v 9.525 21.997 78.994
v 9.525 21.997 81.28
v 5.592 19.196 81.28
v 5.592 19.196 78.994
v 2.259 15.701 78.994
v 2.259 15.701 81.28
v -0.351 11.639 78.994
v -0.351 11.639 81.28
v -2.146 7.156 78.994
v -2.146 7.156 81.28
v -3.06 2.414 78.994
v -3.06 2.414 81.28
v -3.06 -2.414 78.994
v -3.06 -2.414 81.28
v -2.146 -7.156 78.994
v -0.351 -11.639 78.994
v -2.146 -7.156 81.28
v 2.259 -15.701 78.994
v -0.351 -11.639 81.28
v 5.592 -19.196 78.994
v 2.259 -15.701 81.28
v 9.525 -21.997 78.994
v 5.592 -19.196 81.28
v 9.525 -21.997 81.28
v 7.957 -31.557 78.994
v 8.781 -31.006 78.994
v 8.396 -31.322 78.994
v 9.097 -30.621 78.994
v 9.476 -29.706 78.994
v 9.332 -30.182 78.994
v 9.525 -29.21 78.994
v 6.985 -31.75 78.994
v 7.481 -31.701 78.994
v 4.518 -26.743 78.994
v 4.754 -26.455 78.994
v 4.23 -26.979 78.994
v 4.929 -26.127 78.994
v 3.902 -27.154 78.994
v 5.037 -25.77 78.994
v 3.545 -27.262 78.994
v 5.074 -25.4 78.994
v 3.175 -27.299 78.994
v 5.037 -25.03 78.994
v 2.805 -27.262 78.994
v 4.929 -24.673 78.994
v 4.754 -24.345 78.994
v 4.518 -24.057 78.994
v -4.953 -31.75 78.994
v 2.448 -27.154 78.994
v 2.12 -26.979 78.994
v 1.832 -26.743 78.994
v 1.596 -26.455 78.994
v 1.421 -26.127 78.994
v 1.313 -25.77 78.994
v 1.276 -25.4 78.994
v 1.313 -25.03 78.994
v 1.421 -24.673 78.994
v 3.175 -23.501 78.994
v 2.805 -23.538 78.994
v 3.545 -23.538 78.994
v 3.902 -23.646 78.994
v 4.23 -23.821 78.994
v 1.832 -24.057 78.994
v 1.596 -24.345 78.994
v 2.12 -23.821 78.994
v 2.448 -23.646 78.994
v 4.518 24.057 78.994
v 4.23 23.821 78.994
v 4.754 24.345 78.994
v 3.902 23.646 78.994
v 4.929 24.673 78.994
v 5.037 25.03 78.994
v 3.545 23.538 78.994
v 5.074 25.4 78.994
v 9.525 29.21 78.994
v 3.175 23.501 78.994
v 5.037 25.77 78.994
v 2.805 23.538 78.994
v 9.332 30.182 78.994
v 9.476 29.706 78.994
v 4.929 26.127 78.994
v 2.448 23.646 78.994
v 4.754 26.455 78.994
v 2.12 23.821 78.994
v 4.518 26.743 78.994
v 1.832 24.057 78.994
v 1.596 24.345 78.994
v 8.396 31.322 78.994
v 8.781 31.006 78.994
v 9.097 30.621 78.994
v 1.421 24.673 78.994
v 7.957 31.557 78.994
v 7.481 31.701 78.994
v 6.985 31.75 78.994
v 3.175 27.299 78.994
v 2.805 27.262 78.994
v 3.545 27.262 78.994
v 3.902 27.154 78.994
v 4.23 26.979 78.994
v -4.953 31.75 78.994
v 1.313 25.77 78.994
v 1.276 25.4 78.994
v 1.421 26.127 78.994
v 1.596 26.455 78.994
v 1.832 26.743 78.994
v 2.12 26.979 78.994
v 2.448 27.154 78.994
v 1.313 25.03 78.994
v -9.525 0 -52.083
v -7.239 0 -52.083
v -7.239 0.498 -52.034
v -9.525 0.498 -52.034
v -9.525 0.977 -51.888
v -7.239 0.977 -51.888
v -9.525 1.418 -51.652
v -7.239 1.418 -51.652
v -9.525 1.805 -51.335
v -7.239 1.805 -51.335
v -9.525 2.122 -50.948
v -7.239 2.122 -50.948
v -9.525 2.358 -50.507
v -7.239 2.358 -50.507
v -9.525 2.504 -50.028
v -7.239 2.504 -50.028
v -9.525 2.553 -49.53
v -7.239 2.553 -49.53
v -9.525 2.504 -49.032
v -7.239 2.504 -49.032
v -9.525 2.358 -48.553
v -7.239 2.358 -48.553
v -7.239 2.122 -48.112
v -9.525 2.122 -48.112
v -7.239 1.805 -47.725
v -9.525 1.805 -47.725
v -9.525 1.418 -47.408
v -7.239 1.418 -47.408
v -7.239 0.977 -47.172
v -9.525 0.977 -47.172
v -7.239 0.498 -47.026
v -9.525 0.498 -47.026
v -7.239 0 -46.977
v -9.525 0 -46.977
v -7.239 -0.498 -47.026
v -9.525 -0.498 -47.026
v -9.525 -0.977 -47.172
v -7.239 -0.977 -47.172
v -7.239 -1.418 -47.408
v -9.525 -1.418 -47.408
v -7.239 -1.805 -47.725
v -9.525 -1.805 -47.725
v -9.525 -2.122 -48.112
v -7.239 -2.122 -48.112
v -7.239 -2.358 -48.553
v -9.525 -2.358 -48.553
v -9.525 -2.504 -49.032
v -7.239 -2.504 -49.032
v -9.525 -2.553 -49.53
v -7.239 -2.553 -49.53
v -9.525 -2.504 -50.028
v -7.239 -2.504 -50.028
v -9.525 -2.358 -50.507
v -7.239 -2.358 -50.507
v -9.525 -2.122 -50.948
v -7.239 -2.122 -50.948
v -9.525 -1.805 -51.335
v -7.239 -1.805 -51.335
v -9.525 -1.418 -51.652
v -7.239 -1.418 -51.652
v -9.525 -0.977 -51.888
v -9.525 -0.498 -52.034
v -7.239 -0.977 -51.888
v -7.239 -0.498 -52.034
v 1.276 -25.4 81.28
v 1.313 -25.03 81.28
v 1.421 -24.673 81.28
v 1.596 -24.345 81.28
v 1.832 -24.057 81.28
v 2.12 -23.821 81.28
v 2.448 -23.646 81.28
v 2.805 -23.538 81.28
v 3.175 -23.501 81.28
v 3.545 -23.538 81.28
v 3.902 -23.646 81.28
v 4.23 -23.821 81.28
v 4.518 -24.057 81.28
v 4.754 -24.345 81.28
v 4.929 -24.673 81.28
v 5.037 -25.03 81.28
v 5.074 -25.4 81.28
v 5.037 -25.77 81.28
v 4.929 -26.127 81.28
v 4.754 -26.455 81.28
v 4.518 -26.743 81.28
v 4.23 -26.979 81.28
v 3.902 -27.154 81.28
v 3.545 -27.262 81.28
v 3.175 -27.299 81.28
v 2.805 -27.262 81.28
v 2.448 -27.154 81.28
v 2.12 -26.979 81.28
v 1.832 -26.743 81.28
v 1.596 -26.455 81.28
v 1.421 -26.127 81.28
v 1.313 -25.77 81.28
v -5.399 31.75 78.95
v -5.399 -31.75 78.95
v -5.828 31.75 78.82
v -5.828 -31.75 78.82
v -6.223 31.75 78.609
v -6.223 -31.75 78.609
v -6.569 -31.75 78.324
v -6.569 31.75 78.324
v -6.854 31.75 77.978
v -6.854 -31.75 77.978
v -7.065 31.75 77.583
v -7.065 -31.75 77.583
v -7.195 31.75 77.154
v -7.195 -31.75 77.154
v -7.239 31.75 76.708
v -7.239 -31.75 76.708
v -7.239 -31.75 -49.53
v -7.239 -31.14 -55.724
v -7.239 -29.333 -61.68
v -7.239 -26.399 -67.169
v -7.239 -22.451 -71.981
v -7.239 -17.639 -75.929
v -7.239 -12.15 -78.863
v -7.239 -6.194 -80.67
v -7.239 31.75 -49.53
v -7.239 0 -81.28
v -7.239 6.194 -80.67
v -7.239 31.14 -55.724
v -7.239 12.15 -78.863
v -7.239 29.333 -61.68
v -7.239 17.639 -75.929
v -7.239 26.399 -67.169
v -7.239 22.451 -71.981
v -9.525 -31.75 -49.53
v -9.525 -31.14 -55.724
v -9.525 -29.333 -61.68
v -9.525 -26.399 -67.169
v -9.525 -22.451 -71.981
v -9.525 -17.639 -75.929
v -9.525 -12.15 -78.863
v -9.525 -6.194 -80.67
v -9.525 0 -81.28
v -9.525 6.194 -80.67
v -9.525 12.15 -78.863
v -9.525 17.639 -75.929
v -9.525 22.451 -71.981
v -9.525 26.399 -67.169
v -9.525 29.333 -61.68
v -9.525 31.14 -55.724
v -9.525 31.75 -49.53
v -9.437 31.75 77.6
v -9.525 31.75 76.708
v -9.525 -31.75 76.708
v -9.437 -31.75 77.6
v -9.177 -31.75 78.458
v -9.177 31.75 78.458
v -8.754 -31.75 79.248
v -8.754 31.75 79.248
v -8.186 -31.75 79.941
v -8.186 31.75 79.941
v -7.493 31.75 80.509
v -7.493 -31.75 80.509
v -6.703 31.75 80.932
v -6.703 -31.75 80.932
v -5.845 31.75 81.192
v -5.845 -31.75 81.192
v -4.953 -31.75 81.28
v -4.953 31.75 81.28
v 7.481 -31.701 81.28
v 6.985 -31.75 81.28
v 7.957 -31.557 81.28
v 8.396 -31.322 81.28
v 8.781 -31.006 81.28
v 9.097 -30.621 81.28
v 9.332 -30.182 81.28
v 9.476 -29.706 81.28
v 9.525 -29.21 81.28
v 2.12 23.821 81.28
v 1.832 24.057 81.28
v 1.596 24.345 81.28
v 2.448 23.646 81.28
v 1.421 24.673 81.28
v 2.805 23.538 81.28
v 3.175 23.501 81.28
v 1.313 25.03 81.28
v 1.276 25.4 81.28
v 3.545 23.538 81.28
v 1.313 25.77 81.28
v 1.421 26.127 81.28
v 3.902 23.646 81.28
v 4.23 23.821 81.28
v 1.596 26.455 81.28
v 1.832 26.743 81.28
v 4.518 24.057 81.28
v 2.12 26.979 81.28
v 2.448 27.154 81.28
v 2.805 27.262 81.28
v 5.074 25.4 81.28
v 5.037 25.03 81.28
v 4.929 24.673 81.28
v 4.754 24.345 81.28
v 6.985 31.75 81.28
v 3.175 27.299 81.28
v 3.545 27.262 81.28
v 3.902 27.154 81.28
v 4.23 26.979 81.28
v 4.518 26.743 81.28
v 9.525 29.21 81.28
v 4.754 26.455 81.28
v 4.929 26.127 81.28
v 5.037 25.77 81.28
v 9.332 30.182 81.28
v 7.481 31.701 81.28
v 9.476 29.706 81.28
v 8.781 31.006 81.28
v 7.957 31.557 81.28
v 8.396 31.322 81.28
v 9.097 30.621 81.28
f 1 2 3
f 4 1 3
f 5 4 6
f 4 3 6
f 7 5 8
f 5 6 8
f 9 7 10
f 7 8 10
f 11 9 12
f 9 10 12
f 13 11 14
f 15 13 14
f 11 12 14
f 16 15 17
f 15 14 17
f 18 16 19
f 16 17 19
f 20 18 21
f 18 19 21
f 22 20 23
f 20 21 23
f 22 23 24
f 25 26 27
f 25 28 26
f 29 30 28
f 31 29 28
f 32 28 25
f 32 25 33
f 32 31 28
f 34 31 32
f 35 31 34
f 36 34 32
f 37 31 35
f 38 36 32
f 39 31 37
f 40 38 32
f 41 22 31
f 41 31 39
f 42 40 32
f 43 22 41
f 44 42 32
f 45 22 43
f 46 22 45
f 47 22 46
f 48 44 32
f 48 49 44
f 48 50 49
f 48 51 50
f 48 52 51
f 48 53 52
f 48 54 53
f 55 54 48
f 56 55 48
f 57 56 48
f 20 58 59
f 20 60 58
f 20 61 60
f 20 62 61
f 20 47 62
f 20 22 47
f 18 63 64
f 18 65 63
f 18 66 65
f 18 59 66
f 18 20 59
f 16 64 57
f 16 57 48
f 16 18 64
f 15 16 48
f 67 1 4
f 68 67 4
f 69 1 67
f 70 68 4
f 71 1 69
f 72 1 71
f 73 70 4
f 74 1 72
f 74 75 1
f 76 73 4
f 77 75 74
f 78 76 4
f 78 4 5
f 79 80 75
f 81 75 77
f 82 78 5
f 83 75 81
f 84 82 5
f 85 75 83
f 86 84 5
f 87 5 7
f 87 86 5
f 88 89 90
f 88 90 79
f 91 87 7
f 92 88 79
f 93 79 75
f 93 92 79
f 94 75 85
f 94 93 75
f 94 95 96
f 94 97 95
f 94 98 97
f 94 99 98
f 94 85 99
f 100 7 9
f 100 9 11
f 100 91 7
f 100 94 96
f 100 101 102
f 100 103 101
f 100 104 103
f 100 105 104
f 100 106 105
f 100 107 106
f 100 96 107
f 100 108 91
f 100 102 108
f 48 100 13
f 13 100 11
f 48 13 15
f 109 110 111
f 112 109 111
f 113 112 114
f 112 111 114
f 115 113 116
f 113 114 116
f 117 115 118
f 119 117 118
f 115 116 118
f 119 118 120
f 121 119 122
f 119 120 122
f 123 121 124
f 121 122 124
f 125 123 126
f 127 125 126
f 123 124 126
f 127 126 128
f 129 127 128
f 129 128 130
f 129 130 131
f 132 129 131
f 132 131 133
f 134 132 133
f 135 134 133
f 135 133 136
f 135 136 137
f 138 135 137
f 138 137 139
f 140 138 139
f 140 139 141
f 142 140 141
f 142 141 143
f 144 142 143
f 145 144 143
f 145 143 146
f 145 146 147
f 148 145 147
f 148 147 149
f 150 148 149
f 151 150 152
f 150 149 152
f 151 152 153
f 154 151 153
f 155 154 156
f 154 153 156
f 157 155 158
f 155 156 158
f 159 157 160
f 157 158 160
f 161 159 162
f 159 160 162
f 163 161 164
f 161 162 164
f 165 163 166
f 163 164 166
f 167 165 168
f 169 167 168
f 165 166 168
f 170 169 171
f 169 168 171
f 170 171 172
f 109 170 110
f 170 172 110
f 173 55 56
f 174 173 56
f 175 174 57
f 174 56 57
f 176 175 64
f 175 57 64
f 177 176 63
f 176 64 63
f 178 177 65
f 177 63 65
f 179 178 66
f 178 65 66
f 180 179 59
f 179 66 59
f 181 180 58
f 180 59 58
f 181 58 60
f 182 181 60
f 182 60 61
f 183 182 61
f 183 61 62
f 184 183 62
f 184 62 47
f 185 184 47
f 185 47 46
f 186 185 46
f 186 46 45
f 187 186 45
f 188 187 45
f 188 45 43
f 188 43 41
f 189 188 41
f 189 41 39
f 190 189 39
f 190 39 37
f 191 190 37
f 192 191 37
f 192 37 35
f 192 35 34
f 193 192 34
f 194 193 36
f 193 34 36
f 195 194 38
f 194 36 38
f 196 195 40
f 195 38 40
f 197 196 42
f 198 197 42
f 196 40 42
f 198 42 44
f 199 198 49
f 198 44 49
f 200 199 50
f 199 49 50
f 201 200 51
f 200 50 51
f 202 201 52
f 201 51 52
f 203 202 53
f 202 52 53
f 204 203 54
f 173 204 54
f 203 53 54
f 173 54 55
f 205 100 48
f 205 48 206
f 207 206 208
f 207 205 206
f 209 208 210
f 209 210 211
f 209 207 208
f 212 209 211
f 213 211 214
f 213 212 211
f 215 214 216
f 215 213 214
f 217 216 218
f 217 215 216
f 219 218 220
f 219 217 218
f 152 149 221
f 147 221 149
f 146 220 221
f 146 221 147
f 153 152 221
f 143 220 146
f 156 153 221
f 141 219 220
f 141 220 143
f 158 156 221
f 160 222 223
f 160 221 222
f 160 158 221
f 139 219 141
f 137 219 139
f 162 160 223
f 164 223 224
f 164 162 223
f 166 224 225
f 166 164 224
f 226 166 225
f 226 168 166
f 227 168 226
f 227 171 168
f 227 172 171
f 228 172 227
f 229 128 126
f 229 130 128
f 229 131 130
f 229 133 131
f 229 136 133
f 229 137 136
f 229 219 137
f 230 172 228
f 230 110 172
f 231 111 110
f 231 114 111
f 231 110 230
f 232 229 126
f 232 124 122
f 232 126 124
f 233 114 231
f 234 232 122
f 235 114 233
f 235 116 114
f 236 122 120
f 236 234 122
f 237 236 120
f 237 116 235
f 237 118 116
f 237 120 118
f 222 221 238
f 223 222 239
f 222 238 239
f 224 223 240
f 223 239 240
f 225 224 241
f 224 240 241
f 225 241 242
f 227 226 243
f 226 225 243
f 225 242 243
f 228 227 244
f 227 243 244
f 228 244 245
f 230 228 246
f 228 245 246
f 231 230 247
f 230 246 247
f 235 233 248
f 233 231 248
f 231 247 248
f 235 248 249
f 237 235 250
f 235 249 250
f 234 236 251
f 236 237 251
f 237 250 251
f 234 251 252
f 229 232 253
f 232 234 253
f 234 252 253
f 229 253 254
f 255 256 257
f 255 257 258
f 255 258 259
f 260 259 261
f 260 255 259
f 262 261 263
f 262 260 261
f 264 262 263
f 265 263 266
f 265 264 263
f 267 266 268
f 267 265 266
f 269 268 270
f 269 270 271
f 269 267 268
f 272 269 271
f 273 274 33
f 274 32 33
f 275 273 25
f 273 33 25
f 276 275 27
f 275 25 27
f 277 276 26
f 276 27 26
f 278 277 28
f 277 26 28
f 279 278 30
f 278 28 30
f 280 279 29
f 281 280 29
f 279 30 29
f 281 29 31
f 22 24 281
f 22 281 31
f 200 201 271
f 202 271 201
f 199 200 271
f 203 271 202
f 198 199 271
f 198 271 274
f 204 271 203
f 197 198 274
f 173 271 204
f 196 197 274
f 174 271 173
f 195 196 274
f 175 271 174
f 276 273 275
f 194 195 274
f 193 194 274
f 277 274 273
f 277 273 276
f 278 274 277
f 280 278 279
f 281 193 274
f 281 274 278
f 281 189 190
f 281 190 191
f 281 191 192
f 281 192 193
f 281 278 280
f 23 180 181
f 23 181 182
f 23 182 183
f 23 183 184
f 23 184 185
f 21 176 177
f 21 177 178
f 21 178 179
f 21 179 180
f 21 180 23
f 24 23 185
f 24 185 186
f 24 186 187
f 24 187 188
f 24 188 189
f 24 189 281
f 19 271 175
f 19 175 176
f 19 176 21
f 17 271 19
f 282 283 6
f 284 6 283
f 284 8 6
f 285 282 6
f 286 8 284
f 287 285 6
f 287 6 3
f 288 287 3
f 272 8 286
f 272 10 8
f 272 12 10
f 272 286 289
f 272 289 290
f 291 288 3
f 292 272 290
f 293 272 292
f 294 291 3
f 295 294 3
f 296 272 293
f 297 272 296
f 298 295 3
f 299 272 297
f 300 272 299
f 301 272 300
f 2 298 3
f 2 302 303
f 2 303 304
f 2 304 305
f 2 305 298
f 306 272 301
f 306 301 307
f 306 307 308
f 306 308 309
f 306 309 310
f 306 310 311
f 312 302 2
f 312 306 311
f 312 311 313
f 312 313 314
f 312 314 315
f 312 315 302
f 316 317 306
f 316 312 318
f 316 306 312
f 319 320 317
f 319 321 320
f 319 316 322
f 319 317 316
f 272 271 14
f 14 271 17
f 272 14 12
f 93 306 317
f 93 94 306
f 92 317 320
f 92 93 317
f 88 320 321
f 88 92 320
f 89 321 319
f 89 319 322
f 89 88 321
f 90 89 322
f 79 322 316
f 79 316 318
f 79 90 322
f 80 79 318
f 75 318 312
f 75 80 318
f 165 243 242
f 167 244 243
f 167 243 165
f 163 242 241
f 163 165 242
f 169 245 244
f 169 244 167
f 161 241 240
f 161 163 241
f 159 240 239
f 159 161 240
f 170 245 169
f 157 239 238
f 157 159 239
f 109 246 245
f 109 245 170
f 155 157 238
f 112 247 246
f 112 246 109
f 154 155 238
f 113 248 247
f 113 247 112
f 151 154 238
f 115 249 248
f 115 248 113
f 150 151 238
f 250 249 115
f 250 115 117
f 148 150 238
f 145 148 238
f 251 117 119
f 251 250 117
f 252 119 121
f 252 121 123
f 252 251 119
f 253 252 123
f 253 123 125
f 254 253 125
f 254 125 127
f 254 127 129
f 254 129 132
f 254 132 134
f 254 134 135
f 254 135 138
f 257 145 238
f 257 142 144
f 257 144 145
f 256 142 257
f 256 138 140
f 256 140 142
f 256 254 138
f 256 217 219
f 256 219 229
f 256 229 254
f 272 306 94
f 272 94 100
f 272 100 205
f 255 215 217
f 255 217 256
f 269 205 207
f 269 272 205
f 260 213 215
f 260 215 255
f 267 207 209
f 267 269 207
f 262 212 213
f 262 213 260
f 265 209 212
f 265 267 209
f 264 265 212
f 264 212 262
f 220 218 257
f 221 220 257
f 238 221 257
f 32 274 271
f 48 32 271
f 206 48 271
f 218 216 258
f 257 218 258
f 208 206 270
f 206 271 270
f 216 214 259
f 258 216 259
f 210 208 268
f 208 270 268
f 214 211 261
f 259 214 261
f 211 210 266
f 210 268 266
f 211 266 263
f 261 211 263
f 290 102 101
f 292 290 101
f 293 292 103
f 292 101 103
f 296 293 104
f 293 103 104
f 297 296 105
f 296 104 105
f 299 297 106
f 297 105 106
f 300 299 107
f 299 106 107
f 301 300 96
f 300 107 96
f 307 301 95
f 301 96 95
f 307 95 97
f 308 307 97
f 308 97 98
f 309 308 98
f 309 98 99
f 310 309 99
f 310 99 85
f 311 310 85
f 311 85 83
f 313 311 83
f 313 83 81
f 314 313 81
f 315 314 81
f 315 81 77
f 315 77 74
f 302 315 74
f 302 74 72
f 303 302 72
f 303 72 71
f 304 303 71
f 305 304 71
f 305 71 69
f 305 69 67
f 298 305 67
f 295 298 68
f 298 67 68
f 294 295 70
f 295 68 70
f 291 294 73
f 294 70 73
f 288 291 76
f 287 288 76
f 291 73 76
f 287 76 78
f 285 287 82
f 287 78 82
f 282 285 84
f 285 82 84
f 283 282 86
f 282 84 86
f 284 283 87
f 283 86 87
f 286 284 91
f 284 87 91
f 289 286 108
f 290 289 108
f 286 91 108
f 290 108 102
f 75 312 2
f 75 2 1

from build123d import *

# Parameters (mm, degrees)
BASE_FLANGE1_DEPTH           = 31.75
SKETCH6_R                    = 25.4
CUT_EXTRUDE1_DEPTH           = 166.905219101
FILLET1_R                    = 2.54
CUT_EXTRUDE2_DEPTH           = 90.31631094
F_7_0_201_DIAMETER_HOLE1_D   = 5.1054
F_25_0_1495_DIAMETER_HOLE1_D = 3.7973


# Sheet-metal steps are written as plain solids
with BuildPart() as part:
    # Sketch1 → Base-Flange1 (new, symmetric)
    with BuildSketch(Plane(origin=(0, 0, 0), x_dir=(-1, 0, 0), z_dir=(0, 1, 0))):
        with BuildLine():
            Line((9.525, -81.28), (9.525, 76.708))
            ThreePointArc((9.525, 76.708), (8.185892204, 79.940892204), (4.953, 81.28))
            Line((4.953, 81.28), (-9.525, 81.28))
            Line((-9.525, 81.28), (-9.525, 78.994))
            Line((-9.525, 78.994), (4.953, 78.994))
            ThreePointArc((4.953, 78.994), (6.569446102, 78.324446102), (7.239, 76.708))
            Line((7.239, 76.708), (7.239, -81.28))
            Line((7.239, -81.28), (9.525, -81.28))
        make_face()
    extrude(amount=BASE_FLANGE1_DEPTH, both=True)

    # Sketch6 → Cut-Extrude1 (cut, through all)
    with BuildSketch(Plane.XY.offset(81.28)):
        with Locations((22.225, 0)):
            Circle(SKETCH6_R)
    extrude(amount=-CUT_EXTRUDE1_DEPTH, mode=Mode.SUBTRACT)

    # Fillet1
    fillet1_edges = [part.edges().sort_by_distance(p)[0] for p in [
        (9.525, 31.75, 80.137),
        (9.525, -31.75, 80.137),
    ]]
    fillet(fillet1_edges, radius=FILLET1_R)

    # Sketch7 → Cut-Extrude2 (cut, through all)
    with BuildSketch(Plane(origin=(-9.525, 0, 0), x_dir=(0, -1, 0), z_dir=(-1, 0, 0))):
        with BuildLine():
            Line((-31.75, -49.53), (-31.75, -100.33))
            Line((-31.75, -100.33), (31.75, -100.33))
            Line((31.75, -100.33), (31.75, -49.53))
            ThreePointArc((31.75, -49.53), (0, -81.28), (-31.75, -49.53))
        make_face()
    extrude(amount=-CUT_EXTRUDE2_DEPTH, mode=Mode.SUBTRACT)

    # #7 (0.201) Diameter Hole1 (through all)
    with Locations(Plane.ZY.offset(9.525)):
        with Locations((-49.53, 0)):
            Hole(F_7_0_201_DIAMETER_HOLE1_D / 2)

    # #25 (0.1495) Diameter Hole1 (through all)
    with Locations(Plane.XY.offset(81.28)):
        with Locations((3.175, 25.4), (3.175, -25.4)):
            Hole(F_25_0_1495_DIAMETER_HOLE1_D / 2)


solid = part.part
